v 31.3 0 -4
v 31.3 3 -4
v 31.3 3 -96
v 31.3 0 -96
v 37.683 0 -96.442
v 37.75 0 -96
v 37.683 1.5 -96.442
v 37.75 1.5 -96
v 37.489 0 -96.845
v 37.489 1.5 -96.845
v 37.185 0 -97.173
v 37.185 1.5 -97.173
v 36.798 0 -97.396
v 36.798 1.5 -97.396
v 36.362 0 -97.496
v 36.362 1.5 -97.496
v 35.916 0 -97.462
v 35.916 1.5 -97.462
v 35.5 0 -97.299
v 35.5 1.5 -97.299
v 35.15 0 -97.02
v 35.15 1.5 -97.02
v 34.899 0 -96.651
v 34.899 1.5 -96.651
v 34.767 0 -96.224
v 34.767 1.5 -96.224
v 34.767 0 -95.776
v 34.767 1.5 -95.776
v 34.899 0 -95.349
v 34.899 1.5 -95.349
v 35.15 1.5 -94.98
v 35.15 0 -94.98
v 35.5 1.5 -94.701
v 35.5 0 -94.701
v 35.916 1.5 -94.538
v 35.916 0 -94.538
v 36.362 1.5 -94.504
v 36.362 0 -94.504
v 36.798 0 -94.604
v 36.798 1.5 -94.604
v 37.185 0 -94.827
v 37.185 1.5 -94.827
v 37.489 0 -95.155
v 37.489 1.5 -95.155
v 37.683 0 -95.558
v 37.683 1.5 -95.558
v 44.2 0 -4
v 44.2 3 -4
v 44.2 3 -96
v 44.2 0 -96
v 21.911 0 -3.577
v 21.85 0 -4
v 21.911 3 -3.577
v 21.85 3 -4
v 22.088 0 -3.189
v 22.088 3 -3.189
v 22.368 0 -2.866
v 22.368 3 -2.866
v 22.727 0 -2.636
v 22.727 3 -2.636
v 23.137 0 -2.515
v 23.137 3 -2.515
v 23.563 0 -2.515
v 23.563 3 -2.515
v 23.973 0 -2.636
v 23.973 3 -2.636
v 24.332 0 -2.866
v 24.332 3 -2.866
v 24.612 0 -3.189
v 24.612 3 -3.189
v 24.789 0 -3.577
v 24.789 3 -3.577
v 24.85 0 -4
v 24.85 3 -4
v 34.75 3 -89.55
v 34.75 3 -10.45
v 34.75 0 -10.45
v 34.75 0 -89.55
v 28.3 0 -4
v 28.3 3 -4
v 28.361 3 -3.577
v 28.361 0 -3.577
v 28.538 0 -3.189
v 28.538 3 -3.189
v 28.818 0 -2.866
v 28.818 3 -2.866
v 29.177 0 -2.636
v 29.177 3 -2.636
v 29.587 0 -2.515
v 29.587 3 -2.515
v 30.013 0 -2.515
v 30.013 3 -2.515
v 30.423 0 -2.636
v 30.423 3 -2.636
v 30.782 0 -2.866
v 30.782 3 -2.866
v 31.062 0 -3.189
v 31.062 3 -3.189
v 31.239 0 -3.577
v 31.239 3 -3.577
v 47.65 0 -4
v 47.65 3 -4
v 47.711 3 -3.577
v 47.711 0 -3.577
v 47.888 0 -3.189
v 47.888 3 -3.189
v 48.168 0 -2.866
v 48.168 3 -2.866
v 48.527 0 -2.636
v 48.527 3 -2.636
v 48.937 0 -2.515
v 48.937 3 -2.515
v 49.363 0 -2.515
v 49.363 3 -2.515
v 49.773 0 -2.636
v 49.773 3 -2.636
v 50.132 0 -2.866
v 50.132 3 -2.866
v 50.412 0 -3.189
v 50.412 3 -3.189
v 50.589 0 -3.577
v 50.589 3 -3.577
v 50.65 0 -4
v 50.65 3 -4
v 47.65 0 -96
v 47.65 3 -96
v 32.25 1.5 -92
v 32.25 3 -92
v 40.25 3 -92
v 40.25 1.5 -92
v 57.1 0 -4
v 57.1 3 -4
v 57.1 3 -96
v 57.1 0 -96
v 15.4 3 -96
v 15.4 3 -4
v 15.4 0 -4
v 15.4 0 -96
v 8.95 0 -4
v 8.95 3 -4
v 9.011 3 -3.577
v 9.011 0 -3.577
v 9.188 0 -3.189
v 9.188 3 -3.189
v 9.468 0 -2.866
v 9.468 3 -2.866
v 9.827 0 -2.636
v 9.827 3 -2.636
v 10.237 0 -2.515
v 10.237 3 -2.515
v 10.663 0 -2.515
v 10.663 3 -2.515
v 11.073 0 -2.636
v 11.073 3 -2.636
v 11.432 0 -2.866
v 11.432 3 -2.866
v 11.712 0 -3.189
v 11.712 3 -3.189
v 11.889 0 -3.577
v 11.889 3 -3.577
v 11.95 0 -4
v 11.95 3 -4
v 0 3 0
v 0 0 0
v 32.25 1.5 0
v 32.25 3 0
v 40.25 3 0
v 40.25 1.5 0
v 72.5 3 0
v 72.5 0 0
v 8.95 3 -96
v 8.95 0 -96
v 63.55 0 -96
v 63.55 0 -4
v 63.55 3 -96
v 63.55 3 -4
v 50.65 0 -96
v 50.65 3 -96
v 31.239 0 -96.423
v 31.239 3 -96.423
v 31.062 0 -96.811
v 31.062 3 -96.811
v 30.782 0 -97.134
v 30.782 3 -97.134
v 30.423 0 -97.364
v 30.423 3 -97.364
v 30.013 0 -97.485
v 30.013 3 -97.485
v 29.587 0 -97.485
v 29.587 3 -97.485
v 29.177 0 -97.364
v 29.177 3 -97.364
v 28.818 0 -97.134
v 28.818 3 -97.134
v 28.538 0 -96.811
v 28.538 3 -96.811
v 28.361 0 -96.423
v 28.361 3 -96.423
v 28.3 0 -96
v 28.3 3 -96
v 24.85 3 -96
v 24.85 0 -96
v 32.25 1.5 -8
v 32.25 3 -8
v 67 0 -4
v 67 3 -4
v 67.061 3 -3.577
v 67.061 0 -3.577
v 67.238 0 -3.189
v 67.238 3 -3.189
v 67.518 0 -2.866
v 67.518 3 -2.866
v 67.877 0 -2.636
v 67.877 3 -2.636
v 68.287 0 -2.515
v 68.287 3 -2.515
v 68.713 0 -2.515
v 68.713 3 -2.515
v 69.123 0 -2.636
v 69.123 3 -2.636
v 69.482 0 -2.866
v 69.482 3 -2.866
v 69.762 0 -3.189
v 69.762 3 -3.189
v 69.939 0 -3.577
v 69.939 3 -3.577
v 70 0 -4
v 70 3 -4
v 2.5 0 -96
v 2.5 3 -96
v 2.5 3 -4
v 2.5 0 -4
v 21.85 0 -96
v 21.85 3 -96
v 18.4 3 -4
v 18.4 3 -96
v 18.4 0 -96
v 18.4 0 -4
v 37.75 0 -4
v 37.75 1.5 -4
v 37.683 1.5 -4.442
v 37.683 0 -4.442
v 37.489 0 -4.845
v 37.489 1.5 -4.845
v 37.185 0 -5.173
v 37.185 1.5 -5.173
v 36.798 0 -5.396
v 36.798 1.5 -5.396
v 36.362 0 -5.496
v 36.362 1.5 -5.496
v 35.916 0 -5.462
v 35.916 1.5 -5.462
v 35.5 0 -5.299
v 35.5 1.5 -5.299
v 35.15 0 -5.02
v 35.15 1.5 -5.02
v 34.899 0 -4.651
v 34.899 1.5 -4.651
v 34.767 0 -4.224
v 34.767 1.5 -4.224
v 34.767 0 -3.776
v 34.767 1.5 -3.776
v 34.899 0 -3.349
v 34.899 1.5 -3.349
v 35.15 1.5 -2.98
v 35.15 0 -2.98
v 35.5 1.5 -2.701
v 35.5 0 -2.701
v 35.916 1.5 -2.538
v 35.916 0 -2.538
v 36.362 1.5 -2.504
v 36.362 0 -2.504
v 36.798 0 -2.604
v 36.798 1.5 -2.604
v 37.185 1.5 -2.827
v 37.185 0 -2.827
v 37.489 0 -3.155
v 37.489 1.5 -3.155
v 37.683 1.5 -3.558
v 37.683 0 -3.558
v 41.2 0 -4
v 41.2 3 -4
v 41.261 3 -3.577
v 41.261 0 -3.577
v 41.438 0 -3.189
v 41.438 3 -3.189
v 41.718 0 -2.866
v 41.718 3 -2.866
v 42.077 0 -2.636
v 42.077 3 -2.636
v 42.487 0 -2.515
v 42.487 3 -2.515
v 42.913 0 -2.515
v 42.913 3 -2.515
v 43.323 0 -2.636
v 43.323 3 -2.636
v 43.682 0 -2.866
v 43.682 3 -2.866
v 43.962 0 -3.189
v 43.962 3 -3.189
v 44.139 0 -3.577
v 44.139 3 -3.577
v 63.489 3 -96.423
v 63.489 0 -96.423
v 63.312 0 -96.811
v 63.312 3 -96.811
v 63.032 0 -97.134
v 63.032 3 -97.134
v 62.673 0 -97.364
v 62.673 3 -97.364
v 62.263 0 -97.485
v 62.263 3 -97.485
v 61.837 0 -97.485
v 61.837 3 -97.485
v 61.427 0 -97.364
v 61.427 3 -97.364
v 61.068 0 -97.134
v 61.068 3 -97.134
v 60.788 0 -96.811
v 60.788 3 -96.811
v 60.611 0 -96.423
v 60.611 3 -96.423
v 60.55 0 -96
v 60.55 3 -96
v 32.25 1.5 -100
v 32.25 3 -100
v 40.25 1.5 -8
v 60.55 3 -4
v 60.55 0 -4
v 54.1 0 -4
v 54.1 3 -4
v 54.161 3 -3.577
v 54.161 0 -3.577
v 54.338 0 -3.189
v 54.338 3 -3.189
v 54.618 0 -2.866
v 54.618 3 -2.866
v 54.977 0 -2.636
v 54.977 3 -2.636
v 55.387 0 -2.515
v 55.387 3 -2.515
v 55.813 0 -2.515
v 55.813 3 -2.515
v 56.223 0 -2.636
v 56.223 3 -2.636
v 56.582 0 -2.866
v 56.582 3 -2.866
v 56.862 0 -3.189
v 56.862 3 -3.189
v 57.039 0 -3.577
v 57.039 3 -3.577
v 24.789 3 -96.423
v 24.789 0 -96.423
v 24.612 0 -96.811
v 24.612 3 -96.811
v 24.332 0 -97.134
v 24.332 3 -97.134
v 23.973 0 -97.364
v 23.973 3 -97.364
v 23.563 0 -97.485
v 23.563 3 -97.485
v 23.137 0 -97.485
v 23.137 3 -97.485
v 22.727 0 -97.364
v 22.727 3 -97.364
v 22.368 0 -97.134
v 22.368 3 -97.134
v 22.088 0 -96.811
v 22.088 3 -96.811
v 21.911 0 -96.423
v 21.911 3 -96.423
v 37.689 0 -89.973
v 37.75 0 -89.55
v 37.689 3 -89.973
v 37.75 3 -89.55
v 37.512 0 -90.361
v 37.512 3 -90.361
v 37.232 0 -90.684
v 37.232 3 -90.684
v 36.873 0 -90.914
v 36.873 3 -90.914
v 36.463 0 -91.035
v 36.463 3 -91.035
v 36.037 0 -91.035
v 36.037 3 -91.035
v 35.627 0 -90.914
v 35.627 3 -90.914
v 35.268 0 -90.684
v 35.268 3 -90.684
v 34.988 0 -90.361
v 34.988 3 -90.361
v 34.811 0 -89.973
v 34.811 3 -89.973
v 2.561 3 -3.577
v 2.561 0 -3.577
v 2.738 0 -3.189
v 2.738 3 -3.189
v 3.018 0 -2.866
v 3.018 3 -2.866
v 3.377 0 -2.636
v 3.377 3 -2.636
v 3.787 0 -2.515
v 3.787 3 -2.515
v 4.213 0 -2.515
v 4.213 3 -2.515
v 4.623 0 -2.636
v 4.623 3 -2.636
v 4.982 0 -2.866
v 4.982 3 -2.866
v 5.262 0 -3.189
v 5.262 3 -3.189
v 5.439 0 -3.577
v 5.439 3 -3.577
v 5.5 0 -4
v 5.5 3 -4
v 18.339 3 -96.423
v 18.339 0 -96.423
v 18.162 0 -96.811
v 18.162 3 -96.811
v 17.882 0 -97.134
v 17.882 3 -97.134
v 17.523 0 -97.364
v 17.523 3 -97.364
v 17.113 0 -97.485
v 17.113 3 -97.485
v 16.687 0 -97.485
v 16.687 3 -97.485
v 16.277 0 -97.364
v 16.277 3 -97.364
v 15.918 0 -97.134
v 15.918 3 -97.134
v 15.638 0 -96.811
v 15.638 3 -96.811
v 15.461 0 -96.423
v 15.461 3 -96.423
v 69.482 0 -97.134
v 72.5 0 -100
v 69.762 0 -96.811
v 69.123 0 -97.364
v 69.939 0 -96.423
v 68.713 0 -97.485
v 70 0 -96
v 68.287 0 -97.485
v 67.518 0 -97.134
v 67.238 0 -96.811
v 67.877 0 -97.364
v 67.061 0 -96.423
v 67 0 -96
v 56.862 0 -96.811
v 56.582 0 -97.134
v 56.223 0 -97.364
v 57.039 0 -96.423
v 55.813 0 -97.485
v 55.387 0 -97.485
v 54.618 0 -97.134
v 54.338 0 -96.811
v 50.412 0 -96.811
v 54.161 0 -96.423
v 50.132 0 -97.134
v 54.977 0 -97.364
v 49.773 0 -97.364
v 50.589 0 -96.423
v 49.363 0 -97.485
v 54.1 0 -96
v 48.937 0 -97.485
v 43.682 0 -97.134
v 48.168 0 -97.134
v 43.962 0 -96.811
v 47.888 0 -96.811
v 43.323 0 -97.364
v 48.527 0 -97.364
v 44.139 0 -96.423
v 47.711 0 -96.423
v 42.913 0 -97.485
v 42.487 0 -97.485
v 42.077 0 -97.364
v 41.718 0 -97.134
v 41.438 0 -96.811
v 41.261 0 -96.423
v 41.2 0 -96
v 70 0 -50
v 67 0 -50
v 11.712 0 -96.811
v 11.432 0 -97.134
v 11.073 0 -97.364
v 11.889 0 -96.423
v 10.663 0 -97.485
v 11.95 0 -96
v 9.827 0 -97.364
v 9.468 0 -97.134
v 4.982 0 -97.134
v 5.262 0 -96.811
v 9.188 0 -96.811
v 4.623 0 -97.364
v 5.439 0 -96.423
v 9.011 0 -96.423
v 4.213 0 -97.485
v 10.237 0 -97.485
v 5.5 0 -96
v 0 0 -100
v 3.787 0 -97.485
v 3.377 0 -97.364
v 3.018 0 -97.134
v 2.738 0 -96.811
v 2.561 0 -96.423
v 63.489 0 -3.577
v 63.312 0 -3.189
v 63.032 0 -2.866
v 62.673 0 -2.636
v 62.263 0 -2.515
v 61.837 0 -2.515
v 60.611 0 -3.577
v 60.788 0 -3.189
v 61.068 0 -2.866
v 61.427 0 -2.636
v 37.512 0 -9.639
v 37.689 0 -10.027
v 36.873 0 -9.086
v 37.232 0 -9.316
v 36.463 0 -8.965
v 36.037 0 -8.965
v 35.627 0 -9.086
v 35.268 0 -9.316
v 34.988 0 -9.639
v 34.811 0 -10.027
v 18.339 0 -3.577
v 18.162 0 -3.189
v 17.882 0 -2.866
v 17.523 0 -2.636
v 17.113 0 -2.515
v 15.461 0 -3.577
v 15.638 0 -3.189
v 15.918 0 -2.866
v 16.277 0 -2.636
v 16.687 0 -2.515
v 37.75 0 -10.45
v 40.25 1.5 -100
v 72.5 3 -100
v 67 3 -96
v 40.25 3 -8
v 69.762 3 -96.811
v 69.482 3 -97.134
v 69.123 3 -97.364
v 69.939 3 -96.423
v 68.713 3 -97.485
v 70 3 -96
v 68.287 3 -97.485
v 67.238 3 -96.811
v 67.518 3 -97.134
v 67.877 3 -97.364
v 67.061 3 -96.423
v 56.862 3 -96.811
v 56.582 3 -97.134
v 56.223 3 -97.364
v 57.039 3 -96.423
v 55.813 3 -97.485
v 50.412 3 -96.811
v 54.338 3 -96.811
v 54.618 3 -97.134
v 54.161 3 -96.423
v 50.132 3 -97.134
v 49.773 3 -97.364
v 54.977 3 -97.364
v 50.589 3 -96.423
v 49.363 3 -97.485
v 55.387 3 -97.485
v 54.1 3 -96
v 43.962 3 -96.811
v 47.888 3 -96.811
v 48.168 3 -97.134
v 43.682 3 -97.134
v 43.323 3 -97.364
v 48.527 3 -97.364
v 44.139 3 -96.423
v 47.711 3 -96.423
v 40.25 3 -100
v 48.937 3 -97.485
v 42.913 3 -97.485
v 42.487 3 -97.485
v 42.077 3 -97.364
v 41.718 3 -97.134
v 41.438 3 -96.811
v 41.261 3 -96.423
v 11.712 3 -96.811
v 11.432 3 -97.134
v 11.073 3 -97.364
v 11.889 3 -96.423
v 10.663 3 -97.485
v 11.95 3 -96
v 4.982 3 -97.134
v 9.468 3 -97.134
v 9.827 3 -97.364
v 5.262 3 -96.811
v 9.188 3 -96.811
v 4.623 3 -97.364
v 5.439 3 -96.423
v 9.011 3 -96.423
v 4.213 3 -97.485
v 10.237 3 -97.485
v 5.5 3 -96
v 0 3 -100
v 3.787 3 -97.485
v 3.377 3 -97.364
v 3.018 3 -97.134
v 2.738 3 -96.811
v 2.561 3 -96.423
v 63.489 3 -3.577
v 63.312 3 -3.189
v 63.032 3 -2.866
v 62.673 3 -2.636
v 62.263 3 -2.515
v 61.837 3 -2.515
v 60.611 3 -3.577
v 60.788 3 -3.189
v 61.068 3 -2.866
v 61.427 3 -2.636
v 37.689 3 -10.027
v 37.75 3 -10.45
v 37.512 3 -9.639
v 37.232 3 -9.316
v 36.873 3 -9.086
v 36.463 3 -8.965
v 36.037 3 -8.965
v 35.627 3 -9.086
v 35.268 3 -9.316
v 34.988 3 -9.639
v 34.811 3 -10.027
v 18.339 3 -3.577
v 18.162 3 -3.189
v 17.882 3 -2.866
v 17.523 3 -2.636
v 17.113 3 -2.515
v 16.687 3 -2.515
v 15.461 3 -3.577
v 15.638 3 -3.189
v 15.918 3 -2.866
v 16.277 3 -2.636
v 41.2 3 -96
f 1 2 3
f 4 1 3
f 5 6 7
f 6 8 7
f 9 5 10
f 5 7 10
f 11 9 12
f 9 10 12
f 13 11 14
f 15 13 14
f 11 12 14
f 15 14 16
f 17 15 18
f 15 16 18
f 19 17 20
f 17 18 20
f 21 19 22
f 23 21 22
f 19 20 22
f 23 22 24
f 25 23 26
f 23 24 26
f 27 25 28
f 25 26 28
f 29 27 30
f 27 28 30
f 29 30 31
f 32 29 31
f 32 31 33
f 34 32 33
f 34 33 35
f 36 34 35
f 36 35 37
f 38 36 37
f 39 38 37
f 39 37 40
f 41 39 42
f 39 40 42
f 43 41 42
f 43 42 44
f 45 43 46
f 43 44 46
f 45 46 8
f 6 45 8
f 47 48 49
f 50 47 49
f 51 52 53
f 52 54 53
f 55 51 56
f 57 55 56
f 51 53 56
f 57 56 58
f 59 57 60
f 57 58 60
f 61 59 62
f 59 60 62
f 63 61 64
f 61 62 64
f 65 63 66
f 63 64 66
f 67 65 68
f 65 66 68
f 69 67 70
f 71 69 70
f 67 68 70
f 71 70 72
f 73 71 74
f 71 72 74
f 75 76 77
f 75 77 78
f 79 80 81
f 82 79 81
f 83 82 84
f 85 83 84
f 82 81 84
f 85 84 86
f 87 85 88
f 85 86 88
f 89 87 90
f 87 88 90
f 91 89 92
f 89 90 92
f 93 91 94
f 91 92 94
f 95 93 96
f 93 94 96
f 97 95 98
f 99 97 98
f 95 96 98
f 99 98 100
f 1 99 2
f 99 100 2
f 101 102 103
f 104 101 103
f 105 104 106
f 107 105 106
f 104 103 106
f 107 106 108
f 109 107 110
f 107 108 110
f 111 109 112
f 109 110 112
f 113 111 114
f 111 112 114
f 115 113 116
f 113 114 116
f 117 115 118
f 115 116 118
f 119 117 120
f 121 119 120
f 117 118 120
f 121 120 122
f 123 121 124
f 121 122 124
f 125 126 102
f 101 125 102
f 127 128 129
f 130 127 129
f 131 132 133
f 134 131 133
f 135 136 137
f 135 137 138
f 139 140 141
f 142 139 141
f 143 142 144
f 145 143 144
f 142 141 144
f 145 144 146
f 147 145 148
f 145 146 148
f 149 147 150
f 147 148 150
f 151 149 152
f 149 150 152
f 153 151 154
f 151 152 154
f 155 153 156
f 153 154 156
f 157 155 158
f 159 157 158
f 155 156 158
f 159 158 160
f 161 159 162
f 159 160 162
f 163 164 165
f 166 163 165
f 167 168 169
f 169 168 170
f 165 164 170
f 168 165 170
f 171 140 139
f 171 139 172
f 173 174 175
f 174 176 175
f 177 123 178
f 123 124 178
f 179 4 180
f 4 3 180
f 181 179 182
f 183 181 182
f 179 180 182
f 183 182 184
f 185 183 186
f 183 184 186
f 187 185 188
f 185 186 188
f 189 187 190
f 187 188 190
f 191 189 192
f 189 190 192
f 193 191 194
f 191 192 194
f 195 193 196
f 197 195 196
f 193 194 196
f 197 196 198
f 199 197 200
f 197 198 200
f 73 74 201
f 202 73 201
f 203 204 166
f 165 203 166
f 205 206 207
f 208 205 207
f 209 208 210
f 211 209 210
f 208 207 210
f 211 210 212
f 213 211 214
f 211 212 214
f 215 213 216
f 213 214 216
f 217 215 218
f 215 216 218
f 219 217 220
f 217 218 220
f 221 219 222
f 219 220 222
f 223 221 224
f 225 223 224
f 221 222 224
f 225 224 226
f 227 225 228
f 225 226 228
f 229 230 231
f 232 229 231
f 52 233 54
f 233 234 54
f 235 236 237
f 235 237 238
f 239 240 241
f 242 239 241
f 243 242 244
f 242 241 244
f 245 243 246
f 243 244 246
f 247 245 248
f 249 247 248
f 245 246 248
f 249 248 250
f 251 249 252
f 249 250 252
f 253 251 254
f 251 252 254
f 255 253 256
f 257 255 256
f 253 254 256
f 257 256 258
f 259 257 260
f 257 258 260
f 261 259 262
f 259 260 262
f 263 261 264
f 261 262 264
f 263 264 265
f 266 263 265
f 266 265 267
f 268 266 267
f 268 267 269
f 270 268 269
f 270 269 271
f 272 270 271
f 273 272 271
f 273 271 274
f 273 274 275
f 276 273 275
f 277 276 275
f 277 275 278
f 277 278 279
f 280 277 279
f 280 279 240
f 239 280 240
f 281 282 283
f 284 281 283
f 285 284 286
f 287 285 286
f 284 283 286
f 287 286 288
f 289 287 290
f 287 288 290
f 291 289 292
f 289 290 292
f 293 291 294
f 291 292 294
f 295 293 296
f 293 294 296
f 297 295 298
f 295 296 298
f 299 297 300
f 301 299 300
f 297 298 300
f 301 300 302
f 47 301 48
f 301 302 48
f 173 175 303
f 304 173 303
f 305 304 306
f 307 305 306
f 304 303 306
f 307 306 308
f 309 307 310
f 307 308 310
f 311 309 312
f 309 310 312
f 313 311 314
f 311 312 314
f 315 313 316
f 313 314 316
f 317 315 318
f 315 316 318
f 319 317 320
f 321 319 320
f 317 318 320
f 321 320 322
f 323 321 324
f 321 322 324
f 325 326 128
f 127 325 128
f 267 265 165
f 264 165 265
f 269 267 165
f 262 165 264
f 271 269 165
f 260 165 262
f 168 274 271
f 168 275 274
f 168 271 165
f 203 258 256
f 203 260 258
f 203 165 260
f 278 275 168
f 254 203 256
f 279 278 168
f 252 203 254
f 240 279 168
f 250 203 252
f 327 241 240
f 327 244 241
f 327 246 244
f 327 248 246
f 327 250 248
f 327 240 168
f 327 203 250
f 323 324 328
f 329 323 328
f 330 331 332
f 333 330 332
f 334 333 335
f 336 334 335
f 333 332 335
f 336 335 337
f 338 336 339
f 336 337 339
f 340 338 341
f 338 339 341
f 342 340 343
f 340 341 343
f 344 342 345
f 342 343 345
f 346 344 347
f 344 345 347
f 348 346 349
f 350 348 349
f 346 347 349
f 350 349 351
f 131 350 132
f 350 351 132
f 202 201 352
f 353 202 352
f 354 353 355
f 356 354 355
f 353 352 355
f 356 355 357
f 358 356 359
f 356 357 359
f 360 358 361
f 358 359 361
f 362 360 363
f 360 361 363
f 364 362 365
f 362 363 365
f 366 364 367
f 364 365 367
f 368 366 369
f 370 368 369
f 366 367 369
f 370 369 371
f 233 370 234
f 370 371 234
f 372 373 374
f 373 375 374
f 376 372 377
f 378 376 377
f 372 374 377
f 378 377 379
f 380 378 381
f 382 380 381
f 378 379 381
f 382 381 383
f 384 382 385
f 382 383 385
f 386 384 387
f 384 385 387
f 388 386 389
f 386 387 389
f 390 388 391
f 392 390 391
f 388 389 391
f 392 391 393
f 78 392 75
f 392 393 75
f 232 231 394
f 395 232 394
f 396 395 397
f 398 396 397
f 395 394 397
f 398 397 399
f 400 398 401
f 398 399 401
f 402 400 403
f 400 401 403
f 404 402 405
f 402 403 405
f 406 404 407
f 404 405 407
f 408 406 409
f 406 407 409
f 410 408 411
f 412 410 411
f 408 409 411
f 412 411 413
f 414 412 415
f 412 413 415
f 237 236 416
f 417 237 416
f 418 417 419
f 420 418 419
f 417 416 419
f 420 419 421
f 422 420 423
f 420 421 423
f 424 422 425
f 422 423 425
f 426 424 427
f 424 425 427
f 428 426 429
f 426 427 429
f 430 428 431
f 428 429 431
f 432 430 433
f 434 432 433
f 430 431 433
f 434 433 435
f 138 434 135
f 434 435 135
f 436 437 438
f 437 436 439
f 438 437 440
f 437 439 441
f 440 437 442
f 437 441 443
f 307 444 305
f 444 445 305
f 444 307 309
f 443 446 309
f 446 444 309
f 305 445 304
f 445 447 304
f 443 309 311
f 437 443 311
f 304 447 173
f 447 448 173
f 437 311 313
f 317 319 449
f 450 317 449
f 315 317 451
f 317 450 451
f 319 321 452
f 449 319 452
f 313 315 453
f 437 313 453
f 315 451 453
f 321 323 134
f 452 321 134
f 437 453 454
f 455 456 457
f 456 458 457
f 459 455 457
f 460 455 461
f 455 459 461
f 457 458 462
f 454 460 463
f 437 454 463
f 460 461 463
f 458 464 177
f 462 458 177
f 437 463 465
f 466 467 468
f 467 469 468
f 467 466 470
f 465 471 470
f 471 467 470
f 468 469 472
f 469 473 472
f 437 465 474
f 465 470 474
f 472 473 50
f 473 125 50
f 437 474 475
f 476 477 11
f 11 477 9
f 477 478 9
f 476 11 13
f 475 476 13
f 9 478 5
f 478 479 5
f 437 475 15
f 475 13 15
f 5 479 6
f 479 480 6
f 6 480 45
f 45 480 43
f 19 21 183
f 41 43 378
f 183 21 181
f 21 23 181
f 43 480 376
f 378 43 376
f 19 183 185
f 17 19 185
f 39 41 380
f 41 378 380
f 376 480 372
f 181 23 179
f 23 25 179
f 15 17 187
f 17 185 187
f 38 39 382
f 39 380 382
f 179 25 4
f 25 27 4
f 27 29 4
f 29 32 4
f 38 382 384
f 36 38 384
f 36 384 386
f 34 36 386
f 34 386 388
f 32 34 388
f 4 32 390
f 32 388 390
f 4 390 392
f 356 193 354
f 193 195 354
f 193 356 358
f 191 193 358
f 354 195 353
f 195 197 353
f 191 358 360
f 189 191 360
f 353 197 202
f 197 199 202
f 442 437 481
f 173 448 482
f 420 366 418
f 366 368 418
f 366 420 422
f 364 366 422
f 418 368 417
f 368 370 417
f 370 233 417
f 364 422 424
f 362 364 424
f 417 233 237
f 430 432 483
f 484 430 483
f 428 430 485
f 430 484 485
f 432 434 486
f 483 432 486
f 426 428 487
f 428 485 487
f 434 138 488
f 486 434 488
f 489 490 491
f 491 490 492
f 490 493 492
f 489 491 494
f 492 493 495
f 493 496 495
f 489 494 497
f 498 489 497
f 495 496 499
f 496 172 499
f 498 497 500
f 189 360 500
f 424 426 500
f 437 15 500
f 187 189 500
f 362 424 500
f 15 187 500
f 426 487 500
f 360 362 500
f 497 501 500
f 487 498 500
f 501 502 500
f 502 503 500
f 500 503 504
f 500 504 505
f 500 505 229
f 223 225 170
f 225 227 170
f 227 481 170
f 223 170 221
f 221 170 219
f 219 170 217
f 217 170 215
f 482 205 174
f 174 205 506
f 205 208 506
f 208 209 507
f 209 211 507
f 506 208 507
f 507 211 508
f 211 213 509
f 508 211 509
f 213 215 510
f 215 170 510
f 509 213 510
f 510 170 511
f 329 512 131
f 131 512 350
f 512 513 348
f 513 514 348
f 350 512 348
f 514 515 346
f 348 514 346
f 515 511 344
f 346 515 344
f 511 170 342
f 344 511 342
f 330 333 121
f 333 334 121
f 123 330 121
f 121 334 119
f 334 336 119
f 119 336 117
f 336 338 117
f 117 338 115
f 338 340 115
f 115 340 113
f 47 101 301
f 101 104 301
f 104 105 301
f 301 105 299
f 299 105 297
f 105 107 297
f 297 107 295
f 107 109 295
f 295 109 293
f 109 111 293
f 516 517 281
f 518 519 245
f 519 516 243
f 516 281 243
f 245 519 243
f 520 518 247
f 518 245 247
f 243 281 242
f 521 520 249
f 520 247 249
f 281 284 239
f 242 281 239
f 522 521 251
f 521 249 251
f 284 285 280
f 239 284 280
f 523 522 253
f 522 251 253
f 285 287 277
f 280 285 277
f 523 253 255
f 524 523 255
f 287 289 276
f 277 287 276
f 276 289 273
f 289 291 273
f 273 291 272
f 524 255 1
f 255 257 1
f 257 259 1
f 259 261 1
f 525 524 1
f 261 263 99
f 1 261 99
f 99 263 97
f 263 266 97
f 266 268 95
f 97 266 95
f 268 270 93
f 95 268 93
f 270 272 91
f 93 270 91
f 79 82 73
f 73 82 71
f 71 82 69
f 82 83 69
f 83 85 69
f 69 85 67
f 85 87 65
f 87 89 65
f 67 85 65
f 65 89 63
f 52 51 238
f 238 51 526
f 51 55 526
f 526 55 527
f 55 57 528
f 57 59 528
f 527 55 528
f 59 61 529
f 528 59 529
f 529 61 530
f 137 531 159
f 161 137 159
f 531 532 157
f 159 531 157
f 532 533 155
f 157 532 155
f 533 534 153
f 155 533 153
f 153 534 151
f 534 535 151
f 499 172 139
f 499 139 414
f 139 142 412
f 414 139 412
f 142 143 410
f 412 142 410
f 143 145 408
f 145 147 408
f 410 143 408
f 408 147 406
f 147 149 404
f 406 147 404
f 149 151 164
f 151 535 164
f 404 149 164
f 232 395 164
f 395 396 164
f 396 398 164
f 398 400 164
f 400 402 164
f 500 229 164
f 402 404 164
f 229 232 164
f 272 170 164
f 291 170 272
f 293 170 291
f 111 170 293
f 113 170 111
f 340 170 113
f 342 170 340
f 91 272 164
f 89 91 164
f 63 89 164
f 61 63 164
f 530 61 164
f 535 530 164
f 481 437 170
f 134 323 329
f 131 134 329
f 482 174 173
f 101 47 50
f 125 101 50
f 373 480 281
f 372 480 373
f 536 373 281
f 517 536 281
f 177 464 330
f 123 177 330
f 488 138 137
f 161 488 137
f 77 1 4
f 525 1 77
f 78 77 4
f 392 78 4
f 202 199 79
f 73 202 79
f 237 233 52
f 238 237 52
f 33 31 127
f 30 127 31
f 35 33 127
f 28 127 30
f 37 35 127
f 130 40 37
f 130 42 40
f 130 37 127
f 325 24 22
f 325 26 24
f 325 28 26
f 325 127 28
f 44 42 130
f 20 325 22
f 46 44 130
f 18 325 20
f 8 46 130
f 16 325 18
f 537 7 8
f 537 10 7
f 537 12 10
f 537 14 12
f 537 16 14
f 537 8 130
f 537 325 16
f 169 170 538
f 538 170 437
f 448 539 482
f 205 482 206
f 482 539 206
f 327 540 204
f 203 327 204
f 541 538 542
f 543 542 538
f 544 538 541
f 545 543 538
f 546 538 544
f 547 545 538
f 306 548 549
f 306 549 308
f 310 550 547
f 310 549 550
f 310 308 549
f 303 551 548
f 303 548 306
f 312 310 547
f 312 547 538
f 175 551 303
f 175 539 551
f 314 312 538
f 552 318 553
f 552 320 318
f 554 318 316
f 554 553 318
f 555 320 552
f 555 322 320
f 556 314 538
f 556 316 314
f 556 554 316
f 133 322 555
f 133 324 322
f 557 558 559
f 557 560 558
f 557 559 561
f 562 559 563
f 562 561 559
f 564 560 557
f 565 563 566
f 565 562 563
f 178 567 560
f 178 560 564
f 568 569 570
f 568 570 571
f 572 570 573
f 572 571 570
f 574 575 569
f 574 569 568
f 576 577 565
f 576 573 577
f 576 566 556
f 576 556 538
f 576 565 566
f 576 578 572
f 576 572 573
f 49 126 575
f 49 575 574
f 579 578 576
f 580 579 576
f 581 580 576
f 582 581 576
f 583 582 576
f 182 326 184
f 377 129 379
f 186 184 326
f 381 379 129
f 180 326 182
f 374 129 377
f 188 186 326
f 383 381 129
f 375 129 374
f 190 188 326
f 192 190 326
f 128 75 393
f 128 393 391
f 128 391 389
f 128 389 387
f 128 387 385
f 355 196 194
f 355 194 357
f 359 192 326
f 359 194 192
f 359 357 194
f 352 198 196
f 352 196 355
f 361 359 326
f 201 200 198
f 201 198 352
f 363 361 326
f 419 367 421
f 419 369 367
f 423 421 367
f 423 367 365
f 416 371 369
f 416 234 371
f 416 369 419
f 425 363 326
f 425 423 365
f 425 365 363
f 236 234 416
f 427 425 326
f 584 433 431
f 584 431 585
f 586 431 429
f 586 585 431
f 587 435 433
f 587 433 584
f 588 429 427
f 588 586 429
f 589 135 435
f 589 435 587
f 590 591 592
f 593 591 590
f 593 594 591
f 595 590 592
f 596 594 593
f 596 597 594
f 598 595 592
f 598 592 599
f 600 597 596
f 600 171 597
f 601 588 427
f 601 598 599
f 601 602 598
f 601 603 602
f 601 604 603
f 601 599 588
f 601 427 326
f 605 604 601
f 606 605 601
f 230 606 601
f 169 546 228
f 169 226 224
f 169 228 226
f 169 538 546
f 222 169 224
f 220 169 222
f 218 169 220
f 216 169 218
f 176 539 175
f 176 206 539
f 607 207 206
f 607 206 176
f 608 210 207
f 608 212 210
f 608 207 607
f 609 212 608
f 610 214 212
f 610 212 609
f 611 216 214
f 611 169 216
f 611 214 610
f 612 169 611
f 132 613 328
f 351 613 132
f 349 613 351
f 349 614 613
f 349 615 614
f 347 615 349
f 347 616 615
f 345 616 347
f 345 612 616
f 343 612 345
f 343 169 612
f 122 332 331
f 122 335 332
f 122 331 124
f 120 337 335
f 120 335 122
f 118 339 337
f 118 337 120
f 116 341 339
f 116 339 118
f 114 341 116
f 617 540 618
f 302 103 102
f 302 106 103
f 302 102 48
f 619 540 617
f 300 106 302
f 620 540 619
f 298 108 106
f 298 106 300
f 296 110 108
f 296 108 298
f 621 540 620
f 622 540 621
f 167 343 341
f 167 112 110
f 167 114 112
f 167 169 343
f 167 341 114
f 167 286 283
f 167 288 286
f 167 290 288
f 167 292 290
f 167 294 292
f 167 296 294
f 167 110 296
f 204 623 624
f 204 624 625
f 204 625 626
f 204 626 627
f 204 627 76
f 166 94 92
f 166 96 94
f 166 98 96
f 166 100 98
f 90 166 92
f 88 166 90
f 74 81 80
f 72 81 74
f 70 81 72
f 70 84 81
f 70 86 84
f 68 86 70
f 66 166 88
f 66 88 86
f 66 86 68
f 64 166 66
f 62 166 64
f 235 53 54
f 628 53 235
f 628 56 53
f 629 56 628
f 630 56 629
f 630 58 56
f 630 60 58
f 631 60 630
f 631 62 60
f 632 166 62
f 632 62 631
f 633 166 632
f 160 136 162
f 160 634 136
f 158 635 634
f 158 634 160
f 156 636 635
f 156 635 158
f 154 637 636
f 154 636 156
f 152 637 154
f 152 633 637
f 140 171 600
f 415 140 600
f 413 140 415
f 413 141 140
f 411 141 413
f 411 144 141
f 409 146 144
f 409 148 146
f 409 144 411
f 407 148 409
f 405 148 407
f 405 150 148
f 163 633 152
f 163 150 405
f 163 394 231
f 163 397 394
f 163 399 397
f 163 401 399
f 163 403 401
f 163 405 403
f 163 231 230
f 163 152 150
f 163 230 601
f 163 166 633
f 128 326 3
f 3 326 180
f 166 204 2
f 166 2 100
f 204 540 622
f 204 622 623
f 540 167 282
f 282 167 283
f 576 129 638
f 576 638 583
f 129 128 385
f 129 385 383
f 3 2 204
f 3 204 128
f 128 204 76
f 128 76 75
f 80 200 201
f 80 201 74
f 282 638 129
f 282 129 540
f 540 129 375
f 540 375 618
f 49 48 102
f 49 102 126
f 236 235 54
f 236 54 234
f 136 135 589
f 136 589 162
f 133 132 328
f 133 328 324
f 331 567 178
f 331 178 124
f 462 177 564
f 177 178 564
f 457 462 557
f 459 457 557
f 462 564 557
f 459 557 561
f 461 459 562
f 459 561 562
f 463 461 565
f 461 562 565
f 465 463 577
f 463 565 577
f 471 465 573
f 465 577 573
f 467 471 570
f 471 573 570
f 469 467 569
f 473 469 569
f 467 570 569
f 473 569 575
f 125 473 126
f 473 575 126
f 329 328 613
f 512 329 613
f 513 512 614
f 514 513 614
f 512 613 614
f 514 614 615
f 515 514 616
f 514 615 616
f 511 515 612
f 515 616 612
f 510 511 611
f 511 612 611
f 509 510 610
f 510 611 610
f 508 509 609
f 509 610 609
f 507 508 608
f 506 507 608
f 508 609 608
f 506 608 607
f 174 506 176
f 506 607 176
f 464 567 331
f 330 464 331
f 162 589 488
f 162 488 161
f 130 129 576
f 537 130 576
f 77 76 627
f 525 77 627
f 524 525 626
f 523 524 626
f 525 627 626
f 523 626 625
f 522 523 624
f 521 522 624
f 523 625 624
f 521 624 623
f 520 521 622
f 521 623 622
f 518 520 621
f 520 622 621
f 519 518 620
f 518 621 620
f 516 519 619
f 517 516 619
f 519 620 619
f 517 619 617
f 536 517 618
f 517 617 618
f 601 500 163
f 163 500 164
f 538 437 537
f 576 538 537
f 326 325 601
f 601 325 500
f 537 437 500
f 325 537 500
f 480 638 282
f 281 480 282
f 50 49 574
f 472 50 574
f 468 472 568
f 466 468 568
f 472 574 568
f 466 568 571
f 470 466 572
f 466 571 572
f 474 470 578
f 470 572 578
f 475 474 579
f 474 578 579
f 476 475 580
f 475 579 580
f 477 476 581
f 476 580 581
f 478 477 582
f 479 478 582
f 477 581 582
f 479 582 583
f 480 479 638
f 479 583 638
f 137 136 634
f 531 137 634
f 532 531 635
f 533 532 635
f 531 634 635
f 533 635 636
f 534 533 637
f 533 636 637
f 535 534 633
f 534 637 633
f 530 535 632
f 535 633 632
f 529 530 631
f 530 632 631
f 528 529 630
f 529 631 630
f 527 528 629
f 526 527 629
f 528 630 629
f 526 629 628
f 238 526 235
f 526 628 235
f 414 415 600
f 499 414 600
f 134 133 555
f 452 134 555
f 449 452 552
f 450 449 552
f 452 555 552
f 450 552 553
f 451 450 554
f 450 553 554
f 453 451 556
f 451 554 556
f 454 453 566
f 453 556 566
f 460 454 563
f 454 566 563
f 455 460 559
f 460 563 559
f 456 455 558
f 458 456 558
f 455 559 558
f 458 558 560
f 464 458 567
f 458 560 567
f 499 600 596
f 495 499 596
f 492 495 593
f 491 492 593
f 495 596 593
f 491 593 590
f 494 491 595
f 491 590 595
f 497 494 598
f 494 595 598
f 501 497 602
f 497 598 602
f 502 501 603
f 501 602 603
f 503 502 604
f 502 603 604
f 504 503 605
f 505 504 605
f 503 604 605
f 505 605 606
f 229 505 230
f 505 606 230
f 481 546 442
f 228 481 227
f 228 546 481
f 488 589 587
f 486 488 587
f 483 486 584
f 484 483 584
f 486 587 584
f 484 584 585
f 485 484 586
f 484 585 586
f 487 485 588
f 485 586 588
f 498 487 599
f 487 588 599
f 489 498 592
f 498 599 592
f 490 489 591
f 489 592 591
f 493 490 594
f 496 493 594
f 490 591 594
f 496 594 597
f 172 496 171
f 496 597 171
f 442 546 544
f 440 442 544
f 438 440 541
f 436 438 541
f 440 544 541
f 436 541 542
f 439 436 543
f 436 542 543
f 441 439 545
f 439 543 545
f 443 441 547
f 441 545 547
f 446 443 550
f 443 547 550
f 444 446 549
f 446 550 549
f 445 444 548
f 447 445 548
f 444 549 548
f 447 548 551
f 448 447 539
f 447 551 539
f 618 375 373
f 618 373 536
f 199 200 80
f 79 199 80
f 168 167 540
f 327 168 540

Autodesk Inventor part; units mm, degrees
ref_plane "YZ Plane" through (0, 0, 0) normal (1, 0, 0) x (0, 1, 0)
ref_plane "XZ Plane" through (0, 0, 0) normal (0, 1, 0) x (-1, 0, 0)
ref_plane "XY Plane" through (0, 0, 0) normal (0, 0, 1) x (1, 0, 0)
sketch "Sketch1" plane through (0, 0, 0) normal (0, 1, 0) x (-1, 0, 0)
  line L0 (0, 0) -> (-72.5, 0)
  line L1 (-72.5, 0) -> (-72.5, -100)
  line L2 (-72.5, -100) -> (0, -100)
  line L3 (0, -100) -> (0, 0)
  dimension "d0" = 72.5
  dimension "d1" = 100
extrude "Extrusion1" add sketch "Sketch1" along normal blind 3
sketch "Sketch11" plane through (0, 3, 0) normal (0, 1, 0) x (1, 0, 0)
  point P0 (0, 0)
sketch "Sketch13" plane through (0, 3, 0) normal (0, 1, 0) x (1, 0, 0)
  line L0 (0, 0) -> (72.5, 0) projected
  line L1 (36.25, 0) -> (36.25, 8)
  line L2 (36.25, 8) -> (32.25, 8)
  line L3 (32.25, 8) -> (32.25, 0)
  line L4 (36.25, 0) -> (32.25, 0)
  line L5 (36.25, 0) -> (40.25, 0)
  line L6 (40.25, 0) -> (40.25, 8)
  line L7 (40.25, 8) -> (36.25, 8)
  line L8 (72.5, 100) -> (0, 100) projected
  line L9 (36.25, 100) -> (32.25, 100)
  line L10 (32.25, 100) -> (32.25, 92)
  line L11 (32.25, 92) -> (40.25, 92)
  line L12 (40.25, 92) -> (40.25, 100)
  line L13 (40.25, 100) -> (36.25, 100)
  line L14 (72.5, 0) -> (72.5, 100) projected
  dimension "d190" = 8
  dimension "d191" = 4
  dimension "d192" = 4
  dimension "d193" = 8
extrude "Extrusion11" cut sketch "Sketch13" against normal blind 1.5
sketch "Sketch14" plane through (0, 1.5, 0) normal (0, 1, 0) x (1, 0, 0)
  line L0 (0, 0) -> (72.5, 0) projected
  line L1 (40.25, 8) -> (32.25, 8)
  line L2 (32.25, 8) -> (32.25, 0)
  line L3 (32.25, 0) -> (40.25, 0)
  line L4 (40.25, 0) -> (40.25, 8)
  line L5 (72.5, 100) -> (0, 100) projected
  line L6 (40.25, 100) -> (32.25, 100)
  line L7 (32.25, 100) -> (32.25, 92)
  line L8 (32.25, 92) -> (40.25, 92)
  line L9 (40.25, 92) -> (40.25, 100)
  line L10 (72.5, 46) -> (64.5, 46) projected
  line L11 (64.5, 46) -> (64.5, 54) projected
  line L12 (72.5, 46) -> (64.5, 46)
  line L13 (64.5, 46) -> (64.5, 54)
  line L14 (64.5, 54) -> (72.5, 54)
  line L15 (72.5, 54) -> (72.5, 46)
  circle A0 centre (36.25, 4) radius 1.5
  circle A1 centre (36.25, 96) radius 1.5
  circle A2 centre (68.5, 50) radius 1.5
  dimension "d199" = 8
  dimension "d200" = 8
  dimension "d201" = 3
  dimension "d202" = 3
  dimension "d203" = 3
extrude "Extrusion12" cut sketch "Sketch14" against normal blind 1.5 contours A0 | A1 | A2
sketch "Sketch15" plane through (0, 3, 0) normal (0, 1, 0) x (1, 0, 0)
  circle A0 centre (36.25, 4) radius 1.5 projected
  line L0 (0, 100) -> (0, 0) projected
  circle A1 centre (36.25, 96) radius 1.5 projected
  line L1 (32.25, 8) -> (40.25, 8) projected
  arc A2 (2.5, 4) -> (5.5, 4) centre (4, 4) ccw
  arc A3 (15.4, 4) -> (18.4, 4) centre (16.9, 4) ccw
  arc A4 (21.85, 4) -> (24.85, 4) centre (23.35, 4) ccw
  arc A5 (28.3, 4) -> (31.3, 4) centre (29.8, 4) ccw
  arc A6 (41.2, 4) -> (44.2, 4) centre (42.7, 4) ccw
  arc A7 (47.65, 4) -> (50.65, 4) centre (49.15, 4) ccw
  arc A8 (54.1, 4) -> (57.1, 4) centre (55.6, 4) ccw
  arc A9 (60.55, 4) -> (63.55, 4) centre (62.05, 4) ccw
  arc A10 (67, 4) -> (70, 4) centre (68.5, 4) ccw
  arc A11 (70, 96) -> (67, 96) centre (68.5, 96) ccw
  arc A12 (63.55, 96) -> (60.55, 96) centre (62.05, 96) ccw
  arc A13 (57.1, 96) -> (54.1, 96) centre (55.6, 96) ccw
  arc A14 (50.65, 96) -> (47.65, 96) centre (49.15, 96) ccw
  arc A15 (44.2, 96) -> (41.2, 96) centre (42.7, 96) ccw
  arc A16 (31.3, 96) -> (28.3, 96) centre (29.8, 96) ccw
  arc A17 (24.85, 96) -> (21.85, 96) centre (23.35, 96) ccw
  arc A18 (18.4, 96) -> (15.4, 96) centre (16.9, 96) ccw
  arc A19 (5.5, 96) -> (2.5, 96) centre (4, 96) ccw
  line L2 (8.95, 16.45) -> (8.95, 83.55)
  line L3 (11.95, 83.55) -> (11.95, 16.45)
  line L4 (15.4, 4) -> (15.4, 96)
  line L5 (18.4, 96) -> (18.4, 4)
  line L6 (21.85, 96) -> (21.85, 4)
  line L7 (24.85, 4) -> (24.85, 96)
  line L8 (28.3, 96) -> (28.3, 4)
  line L9 (31.3, 4) -> (31.3, 96)
  line L10 (41.2, 96) -> (41.2, 4)
  line L11 (44.2, 4) -> (44.2, 96)
  line L12 (47.65, 96) -> (47.65, 4)
  line L13 (50.65, 4) -> (50.65, 96)
  line L14 (54.1, 96) -> (54.1, 4)
  line L15 (57.1, 4) -> (57.1, 96)
  line L16 (60.55, 96) -> (60.55, 4)
  line L17 (63.55, 4) -> (63.55, 96)
  line L18 (67, 43.55) -> (67, 4)
  line L19 (70, 4) -> (70, 43.55)
  line L20 (67, 56.45) -> (67, 96)
  line L21 (70, 96) -> (70, 56.45)
  line L22 (36.25, 4) -> (36.25, 10.45)
  arc A20 (34.75, 10.45) -> (37.75, 10.45) centre (36.25, 10.45) ccw
  line L23 (36.25, 96) -> (36.25, 89.55)
  arc A21 (37.75, 89.55) -> (34.75, 89.55) centre (36.25, 89.55) ccw
  line L24 (34.75, 10.45) -> (34.75, 89.55)
  line L25 (37.75, 89.55) -> (37.75, 10.45)
  arc A22 (8.95, 4) -> (11.95, 4) centre (10.45, 4) ccw
  arc A23 (11.95, 96) -> (8.95, 96) centre (10.45, 96) ccw
  line L26 (8.95, 96) -> (8.95, 83.55)
  line L27 (11.95, 96) -> (11.95, 83.55)
  line L28 (8.95, 16.45) -> (8.95, 4)
  line L29 (11.95, 16.45) -> (11.95, 4)
  line L30 (5.5, 4) -> (5.5, 43.55)
  line L31 (5.5, 56.45) -> (5.5, 96)
  line L32 (2.5, 96) -> (2.5, 56.45)
  line L33 (2.5, 43.55) -> (2.5, 4)
  line L34 (2.5, 56.45) -> (2.5, 43.55)
  line L35 (5.5, 43.55) -> (5.5, 56.45)
  line L36 (67, 56.45) -> (67, 43.55)
  line L37 (70, 43.55) -> (70, 56.45)
  dimension "d216" = 3
  dimension "d217" = 3
  dimension "d218" = 3
  dimension "d219" = 3
  dimension "d220" = 3
  dimension "d221" = 3
  dimension "d225" = 3
  dimension "d226" = 3
  dimension "d227" = 3
  dimension "d228" = 3
  dimension "d229" = 3
  dimension "d230" = 3
  dimension "d231" = 3
  dimension "d232" = 3
  dimension "d233" = 3
  dimension "d242" = 6.45
  dimension "d243" = 3
  dimension "d244" = 6.45
  dimension "d245" = 3
  dimension "d248" = 3
  dimension "d249" = 3
extrude "Extrusion13" cut sketch "Sketch15" against normal blind 3 contours A20 L24 A21 L25 | L33 L34 L32 A19 L31 L35 L30 A2 | L4 A18 L5 A3 | L6 A17 L7 A4 | L8 A16 L9 A5 | L10 A15 L11 A6 | L12 A14 L13 A7 | L14 A13 L15 A8 | L16 A12 L17 A9 | L18 L36 L20 A11 L21 L37 L19 A10 | L2 L26 A23 L27 L3 L29 A22 L28
sketch "Sketch16" plane through (0, 3, 0) normal (0, 1, 0) x (1, 0, 0)
  point P0 (0, 0)
properties part number "Tray middle"
